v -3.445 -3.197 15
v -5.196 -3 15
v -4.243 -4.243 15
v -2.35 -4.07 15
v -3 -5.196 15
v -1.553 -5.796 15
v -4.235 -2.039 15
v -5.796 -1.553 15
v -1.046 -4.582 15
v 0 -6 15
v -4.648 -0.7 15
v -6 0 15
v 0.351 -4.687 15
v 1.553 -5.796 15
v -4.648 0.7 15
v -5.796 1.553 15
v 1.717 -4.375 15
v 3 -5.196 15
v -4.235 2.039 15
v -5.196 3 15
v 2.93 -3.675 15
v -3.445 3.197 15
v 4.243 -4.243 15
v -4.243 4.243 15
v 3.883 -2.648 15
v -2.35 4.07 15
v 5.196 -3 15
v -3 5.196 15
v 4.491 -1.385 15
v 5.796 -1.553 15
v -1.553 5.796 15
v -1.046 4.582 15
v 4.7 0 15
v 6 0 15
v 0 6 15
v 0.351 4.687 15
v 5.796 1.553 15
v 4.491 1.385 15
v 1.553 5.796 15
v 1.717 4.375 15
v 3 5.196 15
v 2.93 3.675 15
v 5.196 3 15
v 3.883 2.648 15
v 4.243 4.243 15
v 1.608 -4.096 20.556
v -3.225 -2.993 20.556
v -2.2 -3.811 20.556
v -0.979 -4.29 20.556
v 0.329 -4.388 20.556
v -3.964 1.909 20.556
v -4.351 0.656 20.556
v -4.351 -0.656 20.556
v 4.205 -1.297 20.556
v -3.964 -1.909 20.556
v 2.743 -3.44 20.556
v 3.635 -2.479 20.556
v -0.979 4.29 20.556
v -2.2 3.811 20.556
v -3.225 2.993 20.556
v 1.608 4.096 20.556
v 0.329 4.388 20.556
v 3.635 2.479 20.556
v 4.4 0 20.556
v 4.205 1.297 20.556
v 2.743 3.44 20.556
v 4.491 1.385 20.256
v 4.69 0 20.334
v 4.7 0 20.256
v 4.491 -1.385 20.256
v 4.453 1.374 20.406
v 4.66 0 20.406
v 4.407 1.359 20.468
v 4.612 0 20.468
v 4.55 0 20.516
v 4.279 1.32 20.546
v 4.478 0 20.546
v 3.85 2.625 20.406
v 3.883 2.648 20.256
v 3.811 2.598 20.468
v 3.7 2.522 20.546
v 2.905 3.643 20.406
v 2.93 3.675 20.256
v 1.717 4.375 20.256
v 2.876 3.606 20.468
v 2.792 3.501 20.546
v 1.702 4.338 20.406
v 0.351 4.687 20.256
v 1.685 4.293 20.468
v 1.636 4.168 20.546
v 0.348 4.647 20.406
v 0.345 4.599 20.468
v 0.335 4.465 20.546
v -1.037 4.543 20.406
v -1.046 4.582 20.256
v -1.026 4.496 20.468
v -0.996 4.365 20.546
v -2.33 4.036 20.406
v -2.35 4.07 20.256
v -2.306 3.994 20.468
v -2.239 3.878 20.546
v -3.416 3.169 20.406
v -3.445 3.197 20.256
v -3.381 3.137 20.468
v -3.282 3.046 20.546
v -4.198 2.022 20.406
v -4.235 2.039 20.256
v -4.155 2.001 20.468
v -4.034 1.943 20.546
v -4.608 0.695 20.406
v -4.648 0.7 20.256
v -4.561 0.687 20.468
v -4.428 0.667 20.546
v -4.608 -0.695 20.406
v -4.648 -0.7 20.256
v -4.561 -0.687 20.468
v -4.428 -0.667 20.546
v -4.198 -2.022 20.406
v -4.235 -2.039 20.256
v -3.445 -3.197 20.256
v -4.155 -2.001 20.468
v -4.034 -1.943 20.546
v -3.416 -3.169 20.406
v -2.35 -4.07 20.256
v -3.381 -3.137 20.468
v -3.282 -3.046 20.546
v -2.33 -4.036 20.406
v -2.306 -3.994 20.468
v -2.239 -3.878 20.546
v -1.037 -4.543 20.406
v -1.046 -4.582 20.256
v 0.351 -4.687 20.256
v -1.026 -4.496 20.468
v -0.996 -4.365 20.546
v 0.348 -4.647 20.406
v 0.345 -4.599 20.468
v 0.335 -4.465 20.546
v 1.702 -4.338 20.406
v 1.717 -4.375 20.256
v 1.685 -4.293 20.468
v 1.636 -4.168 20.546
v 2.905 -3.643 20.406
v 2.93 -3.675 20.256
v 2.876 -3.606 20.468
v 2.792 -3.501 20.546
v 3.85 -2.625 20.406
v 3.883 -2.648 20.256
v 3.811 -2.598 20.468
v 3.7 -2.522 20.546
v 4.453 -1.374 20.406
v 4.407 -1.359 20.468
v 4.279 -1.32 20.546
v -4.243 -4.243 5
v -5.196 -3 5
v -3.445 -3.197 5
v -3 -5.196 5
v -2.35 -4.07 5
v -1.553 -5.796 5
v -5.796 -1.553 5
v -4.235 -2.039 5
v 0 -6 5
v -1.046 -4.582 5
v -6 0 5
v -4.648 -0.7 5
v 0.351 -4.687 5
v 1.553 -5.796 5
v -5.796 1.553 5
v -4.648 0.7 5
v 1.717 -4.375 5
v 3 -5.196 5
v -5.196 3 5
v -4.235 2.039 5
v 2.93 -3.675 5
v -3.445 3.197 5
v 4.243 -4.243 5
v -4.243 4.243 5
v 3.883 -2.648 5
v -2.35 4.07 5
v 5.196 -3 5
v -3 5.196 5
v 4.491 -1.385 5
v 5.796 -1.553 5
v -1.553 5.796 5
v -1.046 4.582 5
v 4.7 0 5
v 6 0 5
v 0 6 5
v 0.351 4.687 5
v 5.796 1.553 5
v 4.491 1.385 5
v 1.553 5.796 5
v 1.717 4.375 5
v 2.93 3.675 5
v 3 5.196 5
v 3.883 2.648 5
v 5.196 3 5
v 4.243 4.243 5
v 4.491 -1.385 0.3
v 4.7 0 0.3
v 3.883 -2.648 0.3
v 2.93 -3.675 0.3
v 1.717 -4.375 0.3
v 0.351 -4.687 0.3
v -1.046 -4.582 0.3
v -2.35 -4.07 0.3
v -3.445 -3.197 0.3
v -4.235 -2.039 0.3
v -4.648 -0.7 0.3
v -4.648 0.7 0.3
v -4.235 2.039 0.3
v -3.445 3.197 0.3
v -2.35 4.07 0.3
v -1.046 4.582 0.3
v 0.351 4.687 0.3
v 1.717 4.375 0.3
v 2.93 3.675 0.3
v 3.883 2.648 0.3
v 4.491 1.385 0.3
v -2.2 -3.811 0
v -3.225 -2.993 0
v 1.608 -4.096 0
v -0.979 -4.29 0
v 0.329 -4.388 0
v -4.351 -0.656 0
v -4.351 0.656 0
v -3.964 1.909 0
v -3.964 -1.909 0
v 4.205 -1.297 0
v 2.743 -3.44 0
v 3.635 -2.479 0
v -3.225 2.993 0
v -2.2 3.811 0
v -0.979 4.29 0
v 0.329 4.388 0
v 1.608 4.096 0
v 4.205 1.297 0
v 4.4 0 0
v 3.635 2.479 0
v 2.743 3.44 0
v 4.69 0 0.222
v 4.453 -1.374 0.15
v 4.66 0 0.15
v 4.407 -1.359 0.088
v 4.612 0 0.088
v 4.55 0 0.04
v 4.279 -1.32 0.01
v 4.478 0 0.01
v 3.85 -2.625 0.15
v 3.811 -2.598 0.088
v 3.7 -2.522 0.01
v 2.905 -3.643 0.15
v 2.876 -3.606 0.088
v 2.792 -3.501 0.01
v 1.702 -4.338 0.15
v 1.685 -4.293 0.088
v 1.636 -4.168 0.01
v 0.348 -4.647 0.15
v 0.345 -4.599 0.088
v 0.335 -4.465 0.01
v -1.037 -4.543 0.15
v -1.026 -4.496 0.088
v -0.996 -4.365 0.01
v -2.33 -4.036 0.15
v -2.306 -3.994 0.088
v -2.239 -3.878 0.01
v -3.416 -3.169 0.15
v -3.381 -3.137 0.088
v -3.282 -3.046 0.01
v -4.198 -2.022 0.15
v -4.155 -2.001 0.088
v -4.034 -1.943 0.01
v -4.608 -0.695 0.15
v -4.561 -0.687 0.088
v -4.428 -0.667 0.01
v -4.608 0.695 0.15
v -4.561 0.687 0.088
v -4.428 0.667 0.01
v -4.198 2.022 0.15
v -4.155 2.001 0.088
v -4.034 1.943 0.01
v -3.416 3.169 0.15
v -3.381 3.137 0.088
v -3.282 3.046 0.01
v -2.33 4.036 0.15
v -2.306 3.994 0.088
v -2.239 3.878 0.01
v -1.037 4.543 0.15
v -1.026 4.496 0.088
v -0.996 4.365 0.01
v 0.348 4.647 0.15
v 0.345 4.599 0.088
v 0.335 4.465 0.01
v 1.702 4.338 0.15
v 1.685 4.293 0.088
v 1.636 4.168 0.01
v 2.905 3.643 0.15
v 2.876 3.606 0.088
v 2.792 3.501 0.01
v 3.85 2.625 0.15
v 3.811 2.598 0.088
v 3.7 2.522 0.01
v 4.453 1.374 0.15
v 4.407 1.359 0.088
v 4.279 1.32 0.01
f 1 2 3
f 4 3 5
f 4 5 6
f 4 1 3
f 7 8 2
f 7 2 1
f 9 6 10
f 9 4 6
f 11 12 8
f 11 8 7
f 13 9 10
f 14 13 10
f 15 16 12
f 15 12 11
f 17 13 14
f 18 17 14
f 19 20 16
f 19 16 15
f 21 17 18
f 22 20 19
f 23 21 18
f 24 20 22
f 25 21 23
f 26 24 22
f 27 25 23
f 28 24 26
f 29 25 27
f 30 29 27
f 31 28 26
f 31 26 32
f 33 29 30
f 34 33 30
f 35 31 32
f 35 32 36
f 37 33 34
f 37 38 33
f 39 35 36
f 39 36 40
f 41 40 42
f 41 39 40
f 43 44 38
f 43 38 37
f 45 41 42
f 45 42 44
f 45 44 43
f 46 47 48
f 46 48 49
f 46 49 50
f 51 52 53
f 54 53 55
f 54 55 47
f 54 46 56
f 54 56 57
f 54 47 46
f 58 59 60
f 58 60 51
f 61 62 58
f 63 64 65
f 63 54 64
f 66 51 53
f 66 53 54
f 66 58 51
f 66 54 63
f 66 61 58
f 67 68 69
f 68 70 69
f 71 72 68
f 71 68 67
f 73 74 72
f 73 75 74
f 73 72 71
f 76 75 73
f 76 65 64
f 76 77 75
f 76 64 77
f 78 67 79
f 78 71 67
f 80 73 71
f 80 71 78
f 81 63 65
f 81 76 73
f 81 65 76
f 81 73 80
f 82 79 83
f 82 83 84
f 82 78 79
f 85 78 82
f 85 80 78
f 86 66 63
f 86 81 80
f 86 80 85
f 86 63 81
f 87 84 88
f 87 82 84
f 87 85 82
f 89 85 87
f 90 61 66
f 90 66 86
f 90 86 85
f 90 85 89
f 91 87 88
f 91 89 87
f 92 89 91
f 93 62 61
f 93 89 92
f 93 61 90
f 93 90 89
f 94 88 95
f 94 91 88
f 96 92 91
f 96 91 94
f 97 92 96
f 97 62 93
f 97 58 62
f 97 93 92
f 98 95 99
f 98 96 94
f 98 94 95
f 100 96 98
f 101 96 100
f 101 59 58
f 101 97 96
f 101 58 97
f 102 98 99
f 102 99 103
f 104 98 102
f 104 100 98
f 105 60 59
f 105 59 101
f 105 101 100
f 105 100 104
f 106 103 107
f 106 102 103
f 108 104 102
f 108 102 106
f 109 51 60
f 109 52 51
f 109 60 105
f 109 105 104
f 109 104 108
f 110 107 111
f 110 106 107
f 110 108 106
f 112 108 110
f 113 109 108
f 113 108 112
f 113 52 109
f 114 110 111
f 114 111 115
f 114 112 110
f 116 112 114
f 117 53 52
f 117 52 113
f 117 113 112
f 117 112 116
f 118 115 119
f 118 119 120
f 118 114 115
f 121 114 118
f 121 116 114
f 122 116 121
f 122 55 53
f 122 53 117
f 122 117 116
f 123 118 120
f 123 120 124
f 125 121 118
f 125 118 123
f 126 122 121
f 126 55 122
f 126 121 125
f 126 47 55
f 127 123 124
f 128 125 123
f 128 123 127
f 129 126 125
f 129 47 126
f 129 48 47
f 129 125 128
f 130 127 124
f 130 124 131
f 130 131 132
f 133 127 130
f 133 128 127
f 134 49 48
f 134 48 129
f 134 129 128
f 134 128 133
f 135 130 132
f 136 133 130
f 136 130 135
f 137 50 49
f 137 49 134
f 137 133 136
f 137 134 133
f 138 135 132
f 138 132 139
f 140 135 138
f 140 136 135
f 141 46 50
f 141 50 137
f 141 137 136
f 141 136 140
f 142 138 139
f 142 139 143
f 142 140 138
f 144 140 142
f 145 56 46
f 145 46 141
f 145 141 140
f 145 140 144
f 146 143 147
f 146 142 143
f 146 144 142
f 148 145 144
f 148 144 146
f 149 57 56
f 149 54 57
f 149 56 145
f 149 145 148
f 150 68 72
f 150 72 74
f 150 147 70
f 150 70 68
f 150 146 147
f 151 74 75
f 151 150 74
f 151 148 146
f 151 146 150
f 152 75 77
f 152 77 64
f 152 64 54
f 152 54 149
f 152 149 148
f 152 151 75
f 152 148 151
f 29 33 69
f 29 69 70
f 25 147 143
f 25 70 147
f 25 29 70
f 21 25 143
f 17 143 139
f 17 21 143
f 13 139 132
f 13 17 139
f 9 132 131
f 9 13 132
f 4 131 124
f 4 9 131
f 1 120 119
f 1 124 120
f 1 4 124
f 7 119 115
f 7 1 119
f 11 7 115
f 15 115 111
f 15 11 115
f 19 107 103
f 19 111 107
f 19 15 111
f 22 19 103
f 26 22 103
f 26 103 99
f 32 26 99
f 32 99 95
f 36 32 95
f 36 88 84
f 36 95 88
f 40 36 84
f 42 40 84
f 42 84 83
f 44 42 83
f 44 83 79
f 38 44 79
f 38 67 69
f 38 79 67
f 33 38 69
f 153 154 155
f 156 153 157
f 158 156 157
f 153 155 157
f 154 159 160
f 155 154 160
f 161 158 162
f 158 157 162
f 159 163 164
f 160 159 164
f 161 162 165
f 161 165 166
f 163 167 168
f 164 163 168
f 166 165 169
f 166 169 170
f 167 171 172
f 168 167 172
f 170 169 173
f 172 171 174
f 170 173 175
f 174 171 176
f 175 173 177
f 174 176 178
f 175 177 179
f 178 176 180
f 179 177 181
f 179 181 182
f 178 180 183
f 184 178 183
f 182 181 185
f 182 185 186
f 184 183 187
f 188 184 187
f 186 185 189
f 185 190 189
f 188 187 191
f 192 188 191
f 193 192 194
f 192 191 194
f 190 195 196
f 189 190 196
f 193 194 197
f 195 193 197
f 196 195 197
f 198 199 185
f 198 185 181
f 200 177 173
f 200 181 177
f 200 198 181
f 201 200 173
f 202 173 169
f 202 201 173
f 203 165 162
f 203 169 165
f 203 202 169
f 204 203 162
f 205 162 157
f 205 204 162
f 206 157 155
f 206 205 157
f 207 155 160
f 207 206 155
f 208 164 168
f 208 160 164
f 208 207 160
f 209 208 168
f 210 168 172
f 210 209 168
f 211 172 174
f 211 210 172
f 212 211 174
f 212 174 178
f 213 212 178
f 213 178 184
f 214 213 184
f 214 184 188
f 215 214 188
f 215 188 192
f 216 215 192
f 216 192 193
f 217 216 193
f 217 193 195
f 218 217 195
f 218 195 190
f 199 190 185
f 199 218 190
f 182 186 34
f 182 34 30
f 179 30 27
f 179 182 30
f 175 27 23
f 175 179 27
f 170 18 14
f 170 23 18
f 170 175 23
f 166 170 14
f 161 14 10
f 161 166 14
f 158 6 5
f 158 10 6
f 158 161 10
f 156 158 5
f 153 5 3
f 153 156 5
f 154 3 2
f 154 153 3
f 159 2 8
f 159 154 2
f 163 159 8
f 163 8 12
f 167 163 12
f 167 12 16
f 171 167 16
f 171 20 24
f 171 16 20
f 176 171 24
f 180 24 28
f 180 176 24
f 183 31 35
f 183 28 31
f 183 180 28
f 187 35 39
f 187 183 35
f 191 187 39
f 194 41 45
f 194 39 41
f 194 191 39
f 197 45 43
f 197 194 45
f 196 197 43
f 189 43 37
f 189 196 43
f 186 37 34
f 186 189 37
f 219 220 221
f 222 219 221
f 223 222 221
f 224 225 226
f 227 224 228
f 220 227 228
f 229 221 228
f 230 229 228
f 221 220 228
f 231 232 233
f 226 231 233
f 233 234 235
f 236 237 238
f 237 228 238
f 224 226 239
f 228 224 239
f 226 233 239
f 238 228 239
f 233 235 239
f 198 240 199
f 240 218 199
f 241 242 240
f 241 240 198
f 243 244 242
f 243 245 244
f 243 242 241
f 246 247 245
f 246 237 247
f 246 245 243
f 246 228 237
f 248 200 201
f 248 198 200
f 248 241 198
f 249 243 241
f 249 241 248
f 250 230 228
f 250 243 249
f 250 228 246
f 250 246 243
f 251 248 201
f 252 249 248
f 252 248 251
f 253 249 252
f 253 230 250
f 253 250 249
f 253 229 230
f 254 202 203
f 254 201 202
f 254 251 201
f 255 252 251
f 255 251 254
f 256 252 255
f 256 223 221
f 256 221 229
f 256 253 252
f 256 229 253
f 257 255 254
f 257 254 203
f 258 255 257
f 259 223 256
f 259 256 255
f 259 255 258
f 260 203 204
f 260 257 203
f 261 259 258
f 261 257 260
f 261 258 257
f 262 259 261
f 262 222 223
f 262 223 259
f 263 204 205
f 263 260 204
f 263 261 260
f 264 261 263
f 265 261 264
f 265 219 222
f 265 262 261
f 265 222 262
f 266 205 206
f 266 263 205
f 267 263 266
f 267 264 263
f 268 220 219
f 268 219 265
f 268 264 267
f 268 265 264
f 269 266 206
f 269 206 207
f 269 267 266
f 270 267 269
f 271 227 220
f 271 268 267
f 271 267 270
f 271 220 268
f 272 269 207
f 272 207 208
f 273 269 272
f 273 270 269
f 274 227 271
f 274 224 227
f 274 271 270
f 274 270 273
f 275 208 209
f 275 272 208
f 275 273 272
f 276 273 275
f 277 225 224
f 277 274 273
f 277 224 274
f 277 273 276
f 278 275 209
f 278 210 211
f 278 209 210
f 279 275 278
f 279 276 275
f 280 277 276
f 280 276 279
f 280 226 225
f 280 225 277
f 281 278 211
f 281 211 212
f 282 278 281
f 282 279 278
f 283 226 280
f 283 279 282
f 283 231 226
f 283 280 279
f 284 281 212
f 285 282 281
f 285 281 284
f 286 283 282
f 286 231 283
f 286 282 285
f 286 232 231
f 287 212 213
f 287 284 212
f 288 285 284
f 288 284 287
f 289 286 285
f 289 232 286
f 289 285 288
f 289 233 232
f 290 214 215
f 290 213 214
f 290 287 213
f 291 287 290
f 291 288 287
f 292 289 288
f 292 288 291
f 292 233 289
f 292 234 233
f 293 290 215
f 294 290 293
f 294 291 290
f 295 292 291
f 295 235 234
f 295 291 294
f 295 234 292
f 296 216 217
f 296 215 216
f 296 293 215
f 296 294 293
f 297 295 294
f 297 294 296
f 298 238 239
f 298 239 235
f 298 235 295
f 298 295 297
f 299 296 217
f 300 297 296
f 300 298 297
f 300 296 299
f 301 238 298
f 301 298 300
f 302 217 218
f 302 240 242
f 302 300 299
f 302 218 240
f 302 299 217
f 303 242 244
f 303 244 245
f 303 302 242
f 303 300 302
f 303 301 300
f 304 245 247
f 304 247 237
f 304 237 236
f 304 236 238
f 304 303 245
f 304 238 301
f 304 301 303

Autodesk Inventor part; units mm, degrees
ref_plane "YZ Plane" through (0, 0, 0) normal (1, 0, 0) x (0, 1, 0)
ref_plane "XZ Plane" through (0, 0, 0) normal (0, 1, 0) x (-1, 0, 0)
ref_plane "XY Plane" through (0, 0, 0) normal (0, 0, 1) x (1, 0, 0)
sketch "Sketch1" plane through (0, 0, 0) normal (0, 0, 1) x (1, 0, 0)
  circle A0 centre (0, 0) radius 4.7
  dimension "d0" = 9.4
extrude "Extrusion1" add sketch "Sketch1" along normal blind 5
sketch "Sketch2" plane through (0, 0, 5) normal (0, 0, 1) x (1, 0, 0)
  circle A0 centre (0, 0) radius 6
  dimension "d3" = 12
extrude "Extrusion2" add sketch "Sketch2" along normal blind 10
sketch "Sketch3" plane through (0, 0, 15) normal (0, 0, 1) x (1, 0, 0)
  circle A0 centre (0, 0) radius 4.7
  dimension "d6" = 9.4
extrude "Extrusion3" add sketch "Sketch3" along normal blind 5.556
fillet "Fillet1" radius 0.3 2 edges at (-4.7, 0, 20.556) (-4.7, 0, 0)
properties part number "eje escalonado V2"
